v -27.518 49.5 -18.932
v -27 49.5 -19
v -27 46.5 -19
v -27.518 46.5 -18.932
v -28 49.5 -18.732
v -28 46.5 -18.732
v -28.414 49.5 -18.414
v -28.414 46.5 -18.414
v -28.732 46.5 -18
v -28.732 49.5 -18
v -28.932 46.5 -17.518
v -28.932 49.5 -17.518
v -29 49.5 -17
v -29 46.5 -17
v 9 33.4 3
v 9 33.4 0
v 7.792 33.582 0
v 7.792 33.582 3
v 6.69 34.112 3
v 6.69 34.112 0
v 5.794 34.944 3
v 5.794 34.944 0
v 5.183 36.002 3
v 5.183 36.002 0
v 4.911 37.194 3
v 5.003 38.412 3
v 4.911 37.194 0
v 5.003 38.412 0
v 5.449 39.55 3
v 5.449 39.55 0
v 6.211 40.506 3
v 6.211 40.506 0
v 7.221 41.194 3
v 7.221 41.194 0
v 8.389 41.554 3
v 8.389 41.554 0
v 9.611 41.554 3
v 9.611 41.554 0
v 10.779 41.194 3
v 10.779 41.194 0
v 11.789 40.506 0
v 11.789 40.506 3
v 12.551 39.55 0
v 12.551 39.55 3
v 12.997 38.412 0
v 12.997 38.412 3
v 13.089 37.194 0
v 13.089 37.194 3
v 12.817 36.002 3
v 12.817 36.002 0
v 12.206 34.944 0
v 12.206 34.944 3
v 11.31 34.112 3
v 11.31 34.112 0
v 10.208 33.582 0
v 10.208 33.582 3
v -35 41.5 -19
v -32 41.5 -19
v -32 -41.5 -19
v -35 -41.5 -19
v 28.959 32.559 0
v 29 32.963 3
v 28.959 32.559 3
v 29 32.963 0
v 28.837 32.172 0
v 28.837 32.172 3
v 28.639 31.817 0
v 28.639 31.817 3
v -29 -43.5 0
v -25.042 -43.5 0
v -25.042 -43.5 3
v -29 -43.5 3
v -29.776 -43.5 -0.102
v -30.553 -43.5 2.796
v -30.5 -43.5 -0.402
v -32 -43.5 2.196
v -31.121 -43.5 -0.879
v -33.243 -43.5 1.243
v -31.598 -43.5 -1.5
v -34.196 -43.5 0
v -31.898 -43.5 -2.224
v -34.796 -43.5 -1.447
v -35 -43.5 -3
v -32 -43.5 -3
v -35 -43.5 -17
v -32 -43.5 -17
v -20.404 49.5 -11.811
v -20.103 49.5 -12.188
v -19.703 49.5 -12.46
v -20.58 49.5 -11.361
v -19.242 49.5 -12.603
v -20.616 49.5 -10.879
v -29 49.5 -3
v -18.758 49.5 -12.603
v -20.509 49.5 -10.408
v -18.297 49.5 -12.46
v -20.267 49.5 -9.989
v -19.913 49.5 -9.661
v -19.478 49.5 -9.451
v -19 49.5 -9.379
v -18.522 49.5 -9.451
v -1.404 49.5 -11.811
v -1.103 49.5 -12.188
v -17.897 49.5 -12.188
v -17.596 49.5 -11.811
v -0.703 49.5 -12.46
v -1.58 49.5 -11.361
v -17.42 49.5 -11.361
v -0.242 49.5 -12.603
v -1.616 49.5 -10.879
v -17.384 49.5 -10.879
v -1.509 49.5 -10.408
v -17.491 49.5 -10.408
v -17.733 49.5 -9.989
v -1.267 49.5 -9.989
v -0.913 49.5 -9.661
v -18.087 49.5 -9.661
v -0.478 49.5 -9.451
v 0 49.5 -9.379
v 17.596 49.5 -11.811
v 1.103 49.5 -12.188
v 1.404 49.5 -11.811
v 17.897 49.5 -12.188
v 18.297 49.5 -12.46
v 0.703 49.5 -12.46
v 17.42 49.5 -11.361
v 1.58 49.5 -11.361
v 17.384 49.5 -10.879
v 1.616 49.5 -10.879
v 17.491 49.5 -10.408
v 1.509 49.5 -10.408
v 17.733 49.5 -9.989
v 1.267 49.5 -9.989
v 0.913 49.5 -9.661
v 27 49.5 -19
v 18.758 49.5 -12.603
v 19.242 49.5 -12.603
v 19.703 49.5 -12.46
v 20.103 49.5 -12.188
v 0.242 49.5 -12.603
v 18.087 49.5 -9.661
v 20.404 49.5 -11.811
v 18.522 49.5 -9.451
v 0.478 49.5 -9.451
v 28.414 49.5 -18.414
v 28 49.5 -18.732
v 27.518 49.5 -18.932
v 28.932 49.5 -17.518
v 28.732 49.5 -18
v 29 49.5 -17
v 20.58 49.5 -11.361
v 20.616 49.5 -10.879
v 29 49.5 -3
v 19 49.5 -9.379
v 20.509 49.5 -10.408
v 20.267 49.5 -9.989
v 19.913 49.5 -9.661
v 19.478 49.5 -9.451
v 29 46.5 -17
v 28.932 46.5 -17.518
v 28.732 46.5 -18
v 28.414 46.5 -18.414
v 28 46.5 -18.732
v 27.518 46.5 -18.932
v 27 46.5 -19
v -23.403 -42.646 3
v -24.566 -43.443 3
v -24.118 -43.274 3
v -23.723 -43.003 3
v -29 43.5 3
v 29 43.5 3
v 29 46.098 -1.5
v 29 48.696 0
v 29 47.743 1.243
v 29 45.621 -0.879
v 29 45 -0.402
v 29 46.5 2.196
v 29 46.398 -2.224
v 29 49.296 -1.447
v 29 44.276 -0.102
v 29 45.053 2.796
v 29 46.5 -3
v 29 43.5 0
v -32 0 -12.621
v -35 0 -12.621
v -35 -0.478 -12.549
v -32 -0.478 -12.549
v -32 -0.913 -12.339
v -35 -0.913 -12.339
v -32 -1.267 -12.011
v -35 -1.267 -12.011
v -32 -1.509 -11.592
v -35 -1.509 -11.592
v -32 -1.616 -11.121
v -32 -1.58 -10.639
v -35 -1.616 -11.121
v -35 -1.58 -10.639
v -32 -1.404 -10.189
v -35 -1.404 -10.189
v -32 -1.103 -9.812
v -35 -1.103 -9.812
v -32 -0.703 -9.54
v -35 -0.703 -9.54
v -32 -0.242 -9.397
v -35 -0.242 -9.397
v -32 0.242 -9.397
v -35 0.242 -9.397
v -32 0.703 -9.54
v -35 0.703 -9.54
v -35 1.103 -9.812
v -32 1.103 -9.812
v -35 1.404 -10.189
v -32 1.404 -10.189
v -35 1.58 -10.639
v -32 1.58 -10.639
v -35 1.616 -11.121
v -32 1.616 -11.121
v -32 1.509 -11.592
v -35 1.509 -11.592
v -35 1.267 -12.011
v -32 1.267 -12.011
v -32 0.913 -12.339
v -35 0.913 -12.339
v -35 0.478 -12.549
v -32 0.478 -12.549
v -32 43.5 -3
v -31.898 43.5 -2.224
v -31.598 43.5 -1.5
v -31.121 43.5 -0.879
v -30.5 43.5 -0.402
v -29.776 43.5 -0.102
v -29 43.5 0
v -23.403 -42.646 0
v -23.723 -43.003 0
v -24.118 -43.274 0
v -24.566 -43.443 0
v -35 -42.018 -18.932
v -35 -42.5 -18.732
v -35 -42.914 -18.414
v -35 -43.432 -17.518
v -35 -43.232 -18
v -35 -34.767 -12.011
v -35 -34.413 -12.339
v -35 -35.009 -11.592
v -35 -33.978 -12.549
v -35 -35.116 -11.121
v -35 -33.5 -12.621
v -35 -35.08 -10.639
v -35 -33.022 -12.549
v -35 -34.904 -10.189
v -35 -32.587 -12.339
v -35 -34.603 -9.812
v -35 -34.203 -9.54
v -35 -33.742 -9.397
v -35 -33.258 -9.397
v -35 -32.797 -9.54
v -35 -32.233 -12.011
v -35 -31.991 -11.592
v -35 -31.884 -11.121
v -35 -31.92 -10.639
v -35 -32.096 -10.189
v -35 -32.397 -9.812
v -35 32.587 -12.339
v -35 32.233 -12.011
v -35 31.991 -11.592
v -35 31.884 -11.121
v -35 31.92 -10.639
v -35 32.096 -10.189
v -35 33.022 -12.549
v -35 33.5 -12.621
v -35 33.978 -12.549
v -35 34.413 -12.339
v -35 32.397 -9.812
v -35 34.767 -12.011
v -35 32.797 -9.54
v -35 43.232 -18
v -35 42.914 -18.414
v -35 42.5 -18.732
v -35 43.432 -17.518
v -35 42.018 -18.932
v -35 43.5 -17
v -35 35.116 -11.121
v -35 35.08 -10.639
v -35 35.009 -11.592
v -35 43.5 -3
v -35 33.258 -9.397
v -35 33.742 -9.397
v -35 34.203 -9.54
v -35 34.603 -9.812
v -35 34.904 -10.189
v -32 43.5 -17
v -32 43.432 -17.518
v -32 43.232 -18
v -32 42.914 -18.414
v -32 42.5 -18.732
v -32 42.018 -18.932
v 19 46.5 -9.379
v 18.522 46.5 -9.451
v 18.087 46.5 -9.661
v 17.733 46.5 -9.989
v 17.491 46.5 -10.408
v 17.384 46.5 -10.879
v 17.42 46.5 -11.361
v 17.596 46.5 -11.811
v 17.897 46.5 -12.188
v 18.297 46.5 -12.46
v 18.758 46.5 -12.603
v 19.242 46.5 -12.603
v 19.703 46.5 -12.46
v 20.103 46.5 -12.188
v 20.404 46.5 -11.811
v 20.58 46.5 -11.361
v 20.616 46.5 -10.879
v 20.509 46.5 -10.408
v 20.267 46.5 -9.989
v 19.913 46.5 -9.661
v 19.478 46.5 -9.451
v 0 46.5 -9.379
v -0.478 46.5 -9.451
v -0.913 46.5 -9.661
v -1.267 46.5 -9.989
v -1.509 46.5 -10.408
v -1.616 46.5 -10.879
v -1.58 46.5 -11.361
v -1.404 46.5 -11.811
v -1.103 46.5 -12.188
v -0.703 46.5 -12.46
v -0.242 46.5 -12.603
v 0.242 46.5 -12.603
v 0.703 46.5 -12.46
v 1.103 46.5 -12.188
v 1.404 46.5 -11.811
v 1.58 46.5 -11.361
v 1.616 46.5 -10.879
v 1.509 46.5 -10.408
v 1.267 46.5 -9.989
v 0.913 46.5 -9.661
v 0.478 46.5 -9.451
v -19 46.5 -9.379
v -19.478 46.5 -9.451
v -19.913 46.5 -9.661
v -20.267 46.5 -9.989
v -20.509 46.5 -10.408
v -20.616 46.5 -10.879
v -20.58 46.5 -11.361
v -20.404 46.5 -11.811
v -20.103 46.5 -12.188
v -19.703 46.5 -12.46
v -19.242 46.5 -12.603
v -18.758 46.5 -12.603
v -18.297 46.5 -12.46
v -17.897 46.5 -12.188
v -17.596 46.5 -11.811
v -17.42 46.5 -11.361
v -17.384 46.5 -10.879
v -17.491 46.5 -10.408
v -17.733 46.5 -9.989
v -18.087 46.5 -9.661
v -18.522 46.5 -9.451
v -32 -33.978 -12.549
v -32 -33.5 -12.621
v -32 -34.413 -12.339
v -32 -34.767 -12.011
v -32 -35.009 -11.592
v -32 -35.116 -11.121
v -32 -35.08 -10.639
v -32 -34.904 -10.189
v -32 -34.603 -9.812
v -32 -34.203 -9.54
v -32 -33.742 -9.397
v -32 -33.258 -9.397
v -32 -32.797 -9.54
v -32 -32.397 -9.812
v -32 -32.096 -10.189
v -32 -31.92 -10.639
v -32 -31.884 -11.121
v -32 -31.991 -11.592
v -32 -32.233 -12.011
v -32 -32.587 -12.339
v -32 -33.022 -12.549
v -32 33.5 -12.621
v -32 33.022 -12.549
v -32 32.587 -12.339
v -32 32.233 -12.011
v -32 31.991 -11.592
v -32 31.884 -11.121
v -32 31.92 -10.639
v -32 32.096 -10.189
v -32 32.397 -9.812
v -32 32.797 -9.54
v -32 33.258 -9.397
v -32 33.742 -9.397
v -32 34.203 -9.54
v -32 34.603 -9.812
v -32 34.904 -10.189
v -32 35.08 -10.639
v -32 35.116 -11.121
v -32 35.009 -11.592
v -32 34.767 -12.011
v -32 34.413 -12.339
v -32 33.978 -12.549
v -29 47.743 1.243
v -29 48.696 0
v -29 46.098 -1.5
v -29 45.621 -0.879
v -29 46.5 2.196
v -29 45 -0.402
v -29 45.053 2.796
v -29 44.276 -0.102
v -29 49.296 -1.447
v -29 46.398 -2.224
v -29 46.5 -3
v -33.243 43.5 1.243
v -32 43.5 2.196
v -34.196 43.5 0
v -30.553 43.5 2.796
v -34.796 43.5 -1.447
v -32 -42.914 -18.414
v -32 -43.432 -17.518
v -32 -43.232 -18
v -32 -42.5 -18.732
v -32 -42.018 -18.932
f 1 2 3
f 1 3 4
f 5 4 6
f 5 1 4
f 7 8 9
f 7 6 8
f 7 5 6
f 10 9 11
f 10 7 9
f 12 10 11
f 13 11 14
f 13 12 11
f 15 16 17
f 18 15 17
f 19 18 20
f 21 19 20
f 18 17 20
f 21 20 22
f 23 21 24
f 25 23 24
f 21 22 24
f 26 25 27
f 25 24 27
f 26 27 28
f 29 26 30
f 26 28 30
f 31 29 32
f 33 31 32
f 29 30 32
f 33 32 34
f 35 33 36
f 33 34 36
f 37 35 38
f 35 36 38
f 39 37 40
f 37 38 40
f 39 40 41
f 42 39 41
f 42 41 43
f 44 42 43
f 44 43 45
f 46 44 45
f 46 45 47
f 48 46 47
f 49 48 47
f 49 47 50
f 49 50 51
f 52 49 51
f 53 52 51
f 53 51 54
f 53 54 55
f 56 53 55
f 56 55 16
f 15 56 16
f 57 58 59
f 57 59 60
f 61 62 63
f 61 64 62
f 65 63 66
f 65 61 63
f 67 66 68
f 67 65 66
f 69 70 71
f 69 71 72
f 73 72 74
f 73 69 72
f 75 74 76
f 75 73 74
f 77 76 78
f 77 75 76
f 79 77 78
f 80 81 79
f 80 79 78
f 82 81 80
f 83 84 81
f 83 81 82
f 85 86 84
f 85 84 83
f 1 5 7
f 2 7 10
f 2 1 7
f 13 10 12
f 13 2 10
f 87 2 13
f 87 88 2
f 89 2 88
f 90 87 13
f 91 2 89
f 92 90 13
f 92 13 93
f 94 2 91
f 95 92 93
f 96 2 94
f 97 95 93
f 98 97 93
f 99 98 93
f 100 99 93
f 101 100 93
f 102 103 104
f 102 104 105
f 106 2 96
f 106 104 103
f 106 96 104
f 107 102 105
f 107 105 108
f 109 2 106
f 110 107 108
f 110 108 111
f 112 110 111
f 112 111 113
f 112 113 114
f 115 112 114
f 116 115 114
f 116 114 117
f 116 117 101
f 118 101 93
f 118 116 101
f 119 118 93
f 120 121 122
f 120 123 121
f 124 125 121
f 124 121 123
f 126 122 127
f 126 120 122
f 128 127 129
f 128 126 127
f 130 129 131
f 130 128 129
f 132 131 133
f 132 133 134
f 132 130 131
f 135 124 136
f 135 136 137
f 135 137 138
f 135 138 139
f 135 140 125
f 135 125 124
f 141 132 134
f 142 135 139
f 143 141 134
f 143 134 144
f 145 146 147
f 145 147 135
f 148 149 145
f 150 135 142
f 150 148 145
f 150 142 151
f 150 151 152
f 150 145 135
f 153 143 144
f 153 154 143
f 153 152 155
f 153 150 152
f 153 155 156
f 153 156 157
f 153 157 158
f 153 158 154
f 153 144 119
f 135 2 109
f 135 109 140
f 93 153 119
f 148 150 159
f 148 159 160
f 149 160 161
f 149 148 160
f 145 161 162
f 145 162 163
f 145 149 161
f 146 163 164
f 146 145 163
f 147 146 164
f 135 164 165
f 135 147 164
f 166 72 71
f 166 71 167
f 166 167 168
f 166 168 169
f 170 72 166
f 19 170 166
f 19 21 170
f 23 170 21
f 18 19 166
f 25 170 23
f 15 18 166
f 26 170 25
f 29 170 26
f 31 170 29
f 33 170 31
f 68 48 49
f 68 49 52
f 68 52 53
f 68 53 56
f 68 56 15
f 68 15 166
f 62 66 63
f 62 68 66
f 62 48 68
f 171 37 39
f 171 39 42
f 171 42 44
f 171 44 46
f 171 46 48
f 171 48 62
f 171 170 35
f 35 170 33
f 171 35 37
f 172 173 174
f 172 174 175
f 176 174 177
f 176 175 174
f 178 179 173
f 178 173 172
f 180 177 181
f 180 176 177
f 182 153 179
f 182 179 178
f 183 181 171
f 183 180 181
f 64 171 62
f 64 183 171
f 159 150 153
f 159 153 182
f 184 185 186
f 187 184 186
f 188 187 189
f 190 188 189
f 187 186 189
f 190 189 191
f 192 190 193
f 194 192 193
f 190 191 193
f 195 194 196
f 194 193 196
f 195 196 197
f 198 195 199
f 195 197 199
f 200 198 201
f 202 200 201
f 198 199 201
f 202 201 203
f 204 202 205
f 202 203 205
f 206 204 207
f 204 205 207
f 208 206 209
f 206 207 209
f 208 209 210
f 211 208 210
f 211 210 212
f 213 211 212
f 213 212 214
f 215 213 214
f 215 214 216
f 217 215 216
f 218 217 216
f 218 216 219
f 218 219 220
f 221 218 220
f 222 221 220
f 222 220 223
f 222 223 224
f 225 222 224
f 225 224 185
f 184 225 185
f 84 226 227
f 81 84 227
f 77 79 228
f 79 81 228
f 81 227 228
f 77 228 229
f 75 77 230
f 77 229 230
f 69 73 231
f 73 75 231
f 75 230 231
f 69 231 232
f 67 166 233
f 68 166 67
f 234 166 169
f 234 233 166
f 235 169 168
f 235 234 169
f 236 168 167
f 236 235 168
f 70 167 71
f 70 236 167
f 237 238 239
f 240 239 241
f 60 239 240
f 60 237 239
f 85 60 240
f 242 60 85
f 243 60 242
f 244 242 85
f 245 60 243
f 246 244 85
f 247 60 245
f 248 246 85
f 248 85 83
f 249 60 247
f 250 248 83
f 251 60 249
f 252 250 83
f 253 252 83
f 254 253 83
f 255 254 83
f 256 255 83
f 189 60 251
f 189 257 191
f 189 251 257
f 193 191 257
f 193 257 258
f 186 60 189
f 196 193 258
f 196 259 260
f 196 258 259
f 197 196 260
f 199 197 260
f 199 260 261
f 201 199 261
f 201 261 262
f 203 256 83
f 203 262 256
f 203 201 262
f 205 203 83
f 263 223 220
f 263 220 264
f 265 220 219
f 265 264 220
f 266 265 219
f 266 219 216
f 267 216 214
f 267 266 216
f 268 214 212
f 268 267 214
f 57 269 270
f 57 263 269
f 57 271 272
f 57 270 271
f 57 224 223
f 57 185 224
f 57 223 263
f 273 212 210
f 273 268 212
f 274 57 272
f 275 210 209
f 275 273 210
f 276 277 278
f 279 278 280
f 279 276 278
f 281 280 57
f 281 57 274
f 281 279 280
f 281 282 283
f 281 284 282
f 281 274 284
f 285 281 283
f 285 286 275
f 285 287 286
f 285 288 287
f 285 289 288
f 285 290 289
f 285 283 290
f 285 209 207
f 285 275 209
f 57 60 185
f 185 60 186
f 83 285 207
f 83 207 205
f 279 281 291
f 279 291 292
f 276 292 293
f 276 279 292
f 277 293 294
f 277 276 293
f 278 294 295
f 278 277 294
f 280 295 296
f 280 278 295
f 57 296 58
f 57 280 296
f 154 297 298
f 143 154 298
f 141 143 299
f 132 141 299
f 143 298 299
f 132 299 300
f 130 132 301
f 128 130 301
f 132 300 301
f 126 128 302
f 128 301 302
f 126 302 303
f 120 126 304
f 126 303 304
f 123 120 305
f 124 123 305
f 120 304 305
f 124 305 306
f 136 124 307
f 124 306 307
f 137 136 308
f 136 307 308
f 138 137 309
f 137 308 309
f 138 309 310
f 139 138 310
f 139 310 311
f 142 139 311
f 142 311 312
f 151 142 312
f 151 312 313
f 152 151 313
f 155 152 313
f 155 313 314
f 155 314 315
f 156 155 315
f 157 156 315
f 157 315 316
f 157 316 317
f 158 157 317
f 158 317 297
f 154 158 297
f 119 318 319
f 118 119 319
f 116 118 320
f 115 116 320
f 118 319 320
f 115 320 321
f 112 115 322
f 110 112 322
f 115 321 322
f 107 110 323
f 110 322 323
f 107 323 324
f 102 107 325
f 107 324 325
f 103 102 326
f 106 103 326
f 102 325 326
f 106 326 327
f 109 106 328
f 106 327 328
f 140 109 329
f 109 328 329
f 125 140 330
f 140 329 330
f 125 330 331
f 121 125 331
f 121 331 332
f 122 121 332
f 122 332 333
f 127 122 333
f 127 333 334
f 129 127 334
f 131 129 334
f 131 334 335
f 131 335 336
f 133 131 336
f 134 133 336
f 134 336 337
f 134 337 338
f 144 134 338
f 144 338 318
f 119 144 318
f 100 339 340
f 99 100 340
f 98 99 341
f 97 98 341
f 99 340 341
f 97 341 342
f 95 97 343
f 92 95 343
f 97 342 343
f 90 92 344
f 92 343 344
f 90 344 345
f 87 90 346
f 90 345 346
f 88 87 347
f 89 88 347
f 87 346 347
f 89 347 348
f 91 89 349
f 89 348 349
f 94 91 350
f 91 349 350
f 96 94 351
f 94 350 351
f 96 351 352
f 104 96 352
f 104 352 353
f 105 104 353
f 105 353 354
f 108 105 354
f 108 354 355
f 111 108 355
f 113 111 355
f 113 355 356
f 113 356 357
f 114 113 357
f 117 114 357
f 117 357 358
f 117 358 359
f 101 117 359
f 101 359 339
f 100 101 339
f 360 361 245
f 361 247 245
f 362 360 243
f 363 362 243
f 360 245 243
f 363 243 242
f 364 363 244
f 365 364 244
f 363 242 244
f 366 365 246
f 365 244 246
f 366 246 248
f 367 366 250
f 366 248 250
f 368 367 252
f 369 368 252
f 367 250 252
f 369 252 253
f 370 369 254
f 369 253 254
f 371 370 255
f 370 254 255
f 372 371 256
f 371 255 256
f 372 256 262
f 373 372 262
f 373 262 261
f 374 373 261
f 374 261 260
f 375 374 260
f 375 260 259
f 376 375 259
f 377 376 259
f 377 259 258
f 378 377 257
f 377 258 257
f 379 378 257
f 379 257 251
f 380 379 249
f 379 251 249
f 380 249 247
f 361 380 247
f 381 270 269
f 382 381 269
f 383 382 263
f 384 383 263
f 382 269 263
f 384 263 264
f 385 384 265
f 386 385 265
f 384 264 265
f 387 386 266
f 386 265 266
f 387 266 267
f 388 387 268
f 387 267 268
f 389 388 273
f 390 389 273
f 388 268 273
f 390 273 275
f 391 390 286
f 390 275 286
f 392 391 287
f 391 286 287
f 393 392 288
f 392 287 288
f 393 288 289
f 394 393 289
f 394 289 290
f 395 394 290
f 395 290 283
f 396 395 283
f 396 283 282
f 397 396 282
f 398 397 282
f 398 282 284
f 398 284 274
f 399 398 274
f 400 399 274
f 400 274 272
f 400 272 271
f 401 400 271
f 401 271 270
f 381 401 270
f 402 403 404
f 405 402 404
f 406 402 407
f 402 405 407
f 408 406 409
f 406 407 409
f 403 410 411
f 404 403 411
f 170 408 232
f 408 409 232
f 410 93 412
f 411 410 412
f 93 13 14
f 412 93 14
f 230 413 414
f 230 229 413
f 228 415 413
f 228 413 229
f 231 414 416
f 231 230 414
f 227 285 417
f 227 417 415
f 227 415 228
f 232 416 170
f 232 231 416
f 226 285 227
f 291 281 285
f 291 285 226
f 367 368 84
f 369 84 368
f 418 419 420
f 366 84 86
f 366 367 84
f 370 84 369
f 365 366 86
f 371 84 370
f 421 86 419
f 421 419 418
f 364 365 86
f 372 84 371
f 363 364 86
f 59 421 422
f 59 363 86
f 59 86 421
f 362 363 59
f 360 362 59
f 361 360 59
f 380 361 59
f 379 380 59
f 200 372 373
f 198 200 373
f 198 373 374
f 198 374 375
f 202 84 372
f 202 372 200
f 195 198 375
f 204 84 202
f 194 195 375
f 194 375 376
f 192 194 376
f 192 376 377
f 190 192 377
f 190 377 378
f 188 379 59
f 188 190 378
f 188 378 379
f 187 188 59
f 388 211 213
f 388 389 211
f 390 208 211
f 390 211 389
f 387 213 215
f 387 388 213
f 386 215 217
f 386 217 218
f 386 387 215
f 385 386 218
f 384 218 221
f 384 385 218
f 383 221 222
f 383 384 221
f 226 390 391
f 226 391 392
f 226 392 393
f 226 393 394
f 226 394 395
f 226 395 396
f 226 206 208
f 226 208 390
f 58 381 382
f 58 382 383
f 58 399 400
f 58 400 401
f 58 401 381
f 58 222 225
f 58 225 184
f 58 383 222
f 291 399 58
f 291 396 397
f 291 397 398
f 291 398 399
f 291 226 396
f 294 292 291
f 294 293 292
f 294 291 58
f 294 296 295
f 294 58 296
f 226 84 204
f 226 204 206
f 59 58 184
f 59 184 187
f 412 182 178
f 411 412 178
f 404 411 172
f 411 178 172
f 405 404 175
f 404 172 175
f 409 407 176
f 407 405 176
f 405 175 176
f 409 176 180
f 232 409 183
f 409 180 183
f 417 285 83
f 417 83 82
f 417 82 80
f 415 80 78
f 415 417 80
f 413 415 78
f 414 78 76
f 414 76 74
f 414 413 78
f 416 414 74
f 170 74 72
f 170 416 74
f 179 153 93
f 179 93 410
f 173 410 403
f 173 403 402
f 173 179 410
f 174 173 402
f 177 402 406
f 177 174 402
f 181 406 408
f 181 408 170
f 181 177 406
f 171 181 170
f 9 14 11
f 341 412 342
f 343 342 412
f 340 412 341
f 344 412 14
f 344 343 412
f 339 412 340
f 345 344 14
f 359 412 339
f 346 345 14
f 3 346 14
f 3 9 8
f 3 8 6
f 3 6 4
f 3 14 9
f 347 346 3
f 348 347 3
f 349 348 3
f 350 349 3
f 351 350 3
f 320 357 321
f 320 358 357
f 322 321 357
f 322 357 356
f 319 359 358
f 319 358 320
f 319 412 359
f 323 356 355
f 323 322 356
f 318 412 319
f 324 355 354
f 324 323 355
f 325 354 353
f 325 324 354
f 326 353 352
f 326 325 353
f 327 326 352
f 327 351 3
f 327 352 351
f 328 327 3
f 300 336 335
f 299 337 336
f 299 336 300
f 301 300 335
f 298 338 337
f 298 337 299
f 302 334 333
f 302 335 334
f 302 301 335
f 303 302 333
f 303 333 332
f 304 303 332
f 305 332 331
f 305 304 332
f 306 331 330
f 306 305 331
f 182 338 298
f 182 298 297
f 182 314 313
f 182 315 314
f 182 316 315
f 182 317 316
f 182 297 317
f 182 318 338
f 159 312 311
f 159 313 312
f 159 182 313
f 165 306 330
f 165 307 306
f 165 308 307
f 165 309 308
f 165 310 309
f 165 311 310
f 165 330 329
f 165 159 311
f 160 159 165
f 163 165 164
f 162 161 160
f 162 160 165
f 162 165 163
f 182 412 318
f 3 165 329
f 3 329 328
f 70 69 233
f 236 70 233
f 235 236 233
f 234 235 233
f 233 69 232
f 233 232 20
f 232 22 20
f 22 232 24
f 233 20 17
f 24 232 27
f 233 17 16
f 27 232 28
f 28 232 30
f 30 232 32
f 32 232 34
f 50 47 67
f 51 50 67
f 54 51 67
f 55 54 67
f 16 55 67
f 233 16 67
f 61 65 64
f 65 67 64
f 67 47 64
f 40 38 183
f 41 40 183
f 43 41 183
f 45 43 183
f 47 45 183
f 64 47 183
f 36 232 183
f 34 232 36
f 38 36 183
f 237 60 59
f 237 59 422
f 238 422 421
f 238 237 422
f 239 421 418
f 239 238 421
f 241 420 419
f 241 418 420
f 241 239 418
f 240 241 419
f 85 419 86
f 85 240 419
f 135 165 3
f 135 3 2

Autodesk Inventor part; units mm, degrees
ref_plane "YZ Plane" through (0, 0, 0) normal (1, 0, 0) x (0, 1, 0)
ref_plane "XZ Plane" through (0, 0, 0) normal (0, 1, 0) x (-1, 0, 0)
ref_plane "XY Plane" through (0, 0, 0) normal (0, 0, 1) x (1, 0, 0)
sketch "スケッチ1" plane through (0, 0, 0) normal (0, 0, 1) x (1, 0, 0)
  line L0 (29, -43.5) -> (-29, -43.5)
  line L1 (-29, -43.5) -> (-29, 43.5)
  line L2 (-29, 43.5) -> (29, 43.5)
  line L3 (29, 43.5) -> (29, -43.5)
  line L4 (29, -43.5) -> (-29, 43.5) construction
  line L5 (-29, -43.5) -> (29, 43.5) construction
  point P0 (0, 0)
  dimension "d0" = 87
  dimension "d1" = 58
extrude "プレート1" add sketch "スケッチ1" along normal blind 3
sketch "スケッチ2" plane through (-32, 43.5, -3) normal (-1, 0, 0) x (0, -1, 0)
  line L0 (87, 0) -> (0, 0)
  line L1 (0, 0) -> (0, -16)
  line L2 (0, -16) -> (87, -16)
  line L3 (87, -16) -> (87, 0)
edge flange "フランジ1" height 22 angle 90 thickness 3 bend radius 3 thickness toward (-1, 0, 0) relief tear relief width 3 relief depth 1.5 edges at (-29, 0, 0) wall of the first edge with corners at (-32, -43.5, -3) (-32, 43.5, -3) (-32, 43.5, -19) (-32, -43.5, -19)
bend "曲げ1"
corner "コーナー1"
sketch "スケッチ3" plane through (29, 46.5, -3) normal (0, 1, 0) x (-1, 0, 0)
  line L0 (58, 0) -> (0, 0)
  line L1 (0, 0) -> (0, -16)
  line L2 (0, -16) -> (58, -16)
  line L3 (58, -16) -> (58, 0)
edge flange "フランジ2" height 22 angle 90 thickness 3 bend radius 3 thickness toward (0, 1, 0) relief tear relief width 3 relief depth 1.5 edges at (0, 43.5, 0) wall of the first edge with corners at (-29, 46.5, -3) (29, 46.5, -3) (29, 46.5, -19) (-29, 46.5, -19)
bend "曲げ2"
corner "コーナー2"
sketch "スケッチ4" plane through (0, 0, 3) normal (0, 0, 1) x (1, 0, 0)
  line L0 (29, -43.5) -> (-29, -43.5) projected
  line L1 (-24, -43.5) -> (33.3099, 38.5)
  line L2 (-29, -43.5) -> (-29, 43.5) projected
  line L3 (-29, 43.5) -> (29, 43.5) projected
  line L4 (-29, -43.5) -> (-29, 43.5) projected
  line L5 (29, -43.5) -> (-29, -43.5) projected
  line L6 (29, 43.5) -> (29, -43.5) projected
  line L7 (-29, 43.5) -> (29, 43.5) projected
  point P0 (0, 0)
  point P1 (29, 32.3333)
  dimension "d23" = 5
  dimension "d24" = 5
extrude "押し出し1" cut sketch "スケッチ4" against normal through all contours L0 L1 L6
fillet "フィレット1" radius 2 6 edges at (-24, -43.5, 1.5) (-33.5, -43.5, -19) (29, 32.3333, 1.5) (29, 48, -19) (-33.5, 43.5, -19) (-29, 48, -19)
sketch "スケッチ5" plane through (-32, -43.5, -3) normal (1, 0, 0) x (0, 0, -1)
  arc A0 (16, 85) -> (14, 87) centre (14, 85) ccw projected
  line L0 (14, 87) -> (0, 87) projected
  line L1 (0, 87) -> (0, 0) projected
  line L2 (14, 0) -> (0, 0) projected
  arc A1 (14, 0) -> (16, 2) centre (14, 2) ccw projected
  line L3 (16, 2) -> (16, 85) projected
  point P0 (-3, 43.5)
  point P1 (8, 77)
  point P2 (8, 10)
  point P3 (8, 43.5)
  dimension "d28" = 8
  dimension "d29" = 10
  dimension "d30" = 10
  dimension "d31" = 33.5
hole "穴1" at (-32, 33.5, -11) at (-32, -33.5, -11) at (-32, 0, -11) direction (-1, 0, 0) diameter 3.242 end through all thread size "M4x0.7" class "6H" standard "ISO Metric profile"
sketch "スケッチ6" plane through (-29, 49.5, -3) normal (0, 1, 0) x (1, 0, 0)
  line L0 (10, 8) -> (48, 8)
  line L1 (2, 16) -> (56, 16) projected
  line L2 (58, 14) -> (58, 0) projected
  line L3 (0, 0) -> (0, 14) projected
  point P0 (29, -3)
  point P1 (29, 8)
  dimension "d39" = 8
  dimension "d40" = 10
  dimension "d41" = 10
hole "穴2" at (0, 49.5, -11) at (19, 49.5, -11) at (-19, 49.5, -11) direction (0, -1, 0) diameter 3.242 end through all thread size "M4x0.7" class "6H" standard "ISO Metric profile"
sketch "スケッチ8" plane through (0, 0, 3) normal (0, 0, 1) x (1, 0, 0)
  line L0 (-29, 49.5) -> (29, 49.5) projected
  line L1 (29, 43.5) -> (29, 32.9629) projected
  point P0 (0, 0)
  point P1 (9, 37.5)
  dimension "d54" = 12
  dimension "d55" = 20
hole "穴3" at (9, 37.5, 3) direction (0, 0, -1) diameter 8.2 end through all
equation "\"d61\" = Thickness"
equation "\"d2\" = Thickness"
equation "\"d3\" = BendReliefWidth"
equation "\"d4\" = BendReliefDepth"
equation "\"d5\" = MinimumRemnant"
equation "\"d6\" = TransitionRadius"
equation "\"d9\" = BendRadius"
equation "\"d10\" = CornerReliefSize"
equation "\"d11\" = GapSize"
equation "\"d12\" = JacobiRadiusSize"
equation "\"d13\" = BendReliefWidth"
equation "\"d14\" = BendReliefDepth"
equation "\"d15\" = MinimumRemnant"
equation "\"d16\" = TransitionRadius"
equation "\"d19\" = BendRadius"
equation "\"d20\" = CornerReliefSize"
equation "\"d21\" = GapSize"
equation "\"d22\" = JacobiRadiusSize"
equation "\"BendRadius\" = Thickness"
equation "\"BendReliefWidth\" = Thickness"
equation "\"BendReliefDepth\" = 0.5 * Thickness"
equation "\"CornerReliefSize\" = 4 * Thickness"
equation "\"MinimumRemnant\" = 2 * Thickness"
equation "\"TransitionRadius\" = BendRadius"
equation "\"JacobiRadiusSize\" = BendRadius"
equation "\"GapSize\" = Thickness"
equation "\"Thickness\" = 3"
properties part number "CCM_Mount_C"
